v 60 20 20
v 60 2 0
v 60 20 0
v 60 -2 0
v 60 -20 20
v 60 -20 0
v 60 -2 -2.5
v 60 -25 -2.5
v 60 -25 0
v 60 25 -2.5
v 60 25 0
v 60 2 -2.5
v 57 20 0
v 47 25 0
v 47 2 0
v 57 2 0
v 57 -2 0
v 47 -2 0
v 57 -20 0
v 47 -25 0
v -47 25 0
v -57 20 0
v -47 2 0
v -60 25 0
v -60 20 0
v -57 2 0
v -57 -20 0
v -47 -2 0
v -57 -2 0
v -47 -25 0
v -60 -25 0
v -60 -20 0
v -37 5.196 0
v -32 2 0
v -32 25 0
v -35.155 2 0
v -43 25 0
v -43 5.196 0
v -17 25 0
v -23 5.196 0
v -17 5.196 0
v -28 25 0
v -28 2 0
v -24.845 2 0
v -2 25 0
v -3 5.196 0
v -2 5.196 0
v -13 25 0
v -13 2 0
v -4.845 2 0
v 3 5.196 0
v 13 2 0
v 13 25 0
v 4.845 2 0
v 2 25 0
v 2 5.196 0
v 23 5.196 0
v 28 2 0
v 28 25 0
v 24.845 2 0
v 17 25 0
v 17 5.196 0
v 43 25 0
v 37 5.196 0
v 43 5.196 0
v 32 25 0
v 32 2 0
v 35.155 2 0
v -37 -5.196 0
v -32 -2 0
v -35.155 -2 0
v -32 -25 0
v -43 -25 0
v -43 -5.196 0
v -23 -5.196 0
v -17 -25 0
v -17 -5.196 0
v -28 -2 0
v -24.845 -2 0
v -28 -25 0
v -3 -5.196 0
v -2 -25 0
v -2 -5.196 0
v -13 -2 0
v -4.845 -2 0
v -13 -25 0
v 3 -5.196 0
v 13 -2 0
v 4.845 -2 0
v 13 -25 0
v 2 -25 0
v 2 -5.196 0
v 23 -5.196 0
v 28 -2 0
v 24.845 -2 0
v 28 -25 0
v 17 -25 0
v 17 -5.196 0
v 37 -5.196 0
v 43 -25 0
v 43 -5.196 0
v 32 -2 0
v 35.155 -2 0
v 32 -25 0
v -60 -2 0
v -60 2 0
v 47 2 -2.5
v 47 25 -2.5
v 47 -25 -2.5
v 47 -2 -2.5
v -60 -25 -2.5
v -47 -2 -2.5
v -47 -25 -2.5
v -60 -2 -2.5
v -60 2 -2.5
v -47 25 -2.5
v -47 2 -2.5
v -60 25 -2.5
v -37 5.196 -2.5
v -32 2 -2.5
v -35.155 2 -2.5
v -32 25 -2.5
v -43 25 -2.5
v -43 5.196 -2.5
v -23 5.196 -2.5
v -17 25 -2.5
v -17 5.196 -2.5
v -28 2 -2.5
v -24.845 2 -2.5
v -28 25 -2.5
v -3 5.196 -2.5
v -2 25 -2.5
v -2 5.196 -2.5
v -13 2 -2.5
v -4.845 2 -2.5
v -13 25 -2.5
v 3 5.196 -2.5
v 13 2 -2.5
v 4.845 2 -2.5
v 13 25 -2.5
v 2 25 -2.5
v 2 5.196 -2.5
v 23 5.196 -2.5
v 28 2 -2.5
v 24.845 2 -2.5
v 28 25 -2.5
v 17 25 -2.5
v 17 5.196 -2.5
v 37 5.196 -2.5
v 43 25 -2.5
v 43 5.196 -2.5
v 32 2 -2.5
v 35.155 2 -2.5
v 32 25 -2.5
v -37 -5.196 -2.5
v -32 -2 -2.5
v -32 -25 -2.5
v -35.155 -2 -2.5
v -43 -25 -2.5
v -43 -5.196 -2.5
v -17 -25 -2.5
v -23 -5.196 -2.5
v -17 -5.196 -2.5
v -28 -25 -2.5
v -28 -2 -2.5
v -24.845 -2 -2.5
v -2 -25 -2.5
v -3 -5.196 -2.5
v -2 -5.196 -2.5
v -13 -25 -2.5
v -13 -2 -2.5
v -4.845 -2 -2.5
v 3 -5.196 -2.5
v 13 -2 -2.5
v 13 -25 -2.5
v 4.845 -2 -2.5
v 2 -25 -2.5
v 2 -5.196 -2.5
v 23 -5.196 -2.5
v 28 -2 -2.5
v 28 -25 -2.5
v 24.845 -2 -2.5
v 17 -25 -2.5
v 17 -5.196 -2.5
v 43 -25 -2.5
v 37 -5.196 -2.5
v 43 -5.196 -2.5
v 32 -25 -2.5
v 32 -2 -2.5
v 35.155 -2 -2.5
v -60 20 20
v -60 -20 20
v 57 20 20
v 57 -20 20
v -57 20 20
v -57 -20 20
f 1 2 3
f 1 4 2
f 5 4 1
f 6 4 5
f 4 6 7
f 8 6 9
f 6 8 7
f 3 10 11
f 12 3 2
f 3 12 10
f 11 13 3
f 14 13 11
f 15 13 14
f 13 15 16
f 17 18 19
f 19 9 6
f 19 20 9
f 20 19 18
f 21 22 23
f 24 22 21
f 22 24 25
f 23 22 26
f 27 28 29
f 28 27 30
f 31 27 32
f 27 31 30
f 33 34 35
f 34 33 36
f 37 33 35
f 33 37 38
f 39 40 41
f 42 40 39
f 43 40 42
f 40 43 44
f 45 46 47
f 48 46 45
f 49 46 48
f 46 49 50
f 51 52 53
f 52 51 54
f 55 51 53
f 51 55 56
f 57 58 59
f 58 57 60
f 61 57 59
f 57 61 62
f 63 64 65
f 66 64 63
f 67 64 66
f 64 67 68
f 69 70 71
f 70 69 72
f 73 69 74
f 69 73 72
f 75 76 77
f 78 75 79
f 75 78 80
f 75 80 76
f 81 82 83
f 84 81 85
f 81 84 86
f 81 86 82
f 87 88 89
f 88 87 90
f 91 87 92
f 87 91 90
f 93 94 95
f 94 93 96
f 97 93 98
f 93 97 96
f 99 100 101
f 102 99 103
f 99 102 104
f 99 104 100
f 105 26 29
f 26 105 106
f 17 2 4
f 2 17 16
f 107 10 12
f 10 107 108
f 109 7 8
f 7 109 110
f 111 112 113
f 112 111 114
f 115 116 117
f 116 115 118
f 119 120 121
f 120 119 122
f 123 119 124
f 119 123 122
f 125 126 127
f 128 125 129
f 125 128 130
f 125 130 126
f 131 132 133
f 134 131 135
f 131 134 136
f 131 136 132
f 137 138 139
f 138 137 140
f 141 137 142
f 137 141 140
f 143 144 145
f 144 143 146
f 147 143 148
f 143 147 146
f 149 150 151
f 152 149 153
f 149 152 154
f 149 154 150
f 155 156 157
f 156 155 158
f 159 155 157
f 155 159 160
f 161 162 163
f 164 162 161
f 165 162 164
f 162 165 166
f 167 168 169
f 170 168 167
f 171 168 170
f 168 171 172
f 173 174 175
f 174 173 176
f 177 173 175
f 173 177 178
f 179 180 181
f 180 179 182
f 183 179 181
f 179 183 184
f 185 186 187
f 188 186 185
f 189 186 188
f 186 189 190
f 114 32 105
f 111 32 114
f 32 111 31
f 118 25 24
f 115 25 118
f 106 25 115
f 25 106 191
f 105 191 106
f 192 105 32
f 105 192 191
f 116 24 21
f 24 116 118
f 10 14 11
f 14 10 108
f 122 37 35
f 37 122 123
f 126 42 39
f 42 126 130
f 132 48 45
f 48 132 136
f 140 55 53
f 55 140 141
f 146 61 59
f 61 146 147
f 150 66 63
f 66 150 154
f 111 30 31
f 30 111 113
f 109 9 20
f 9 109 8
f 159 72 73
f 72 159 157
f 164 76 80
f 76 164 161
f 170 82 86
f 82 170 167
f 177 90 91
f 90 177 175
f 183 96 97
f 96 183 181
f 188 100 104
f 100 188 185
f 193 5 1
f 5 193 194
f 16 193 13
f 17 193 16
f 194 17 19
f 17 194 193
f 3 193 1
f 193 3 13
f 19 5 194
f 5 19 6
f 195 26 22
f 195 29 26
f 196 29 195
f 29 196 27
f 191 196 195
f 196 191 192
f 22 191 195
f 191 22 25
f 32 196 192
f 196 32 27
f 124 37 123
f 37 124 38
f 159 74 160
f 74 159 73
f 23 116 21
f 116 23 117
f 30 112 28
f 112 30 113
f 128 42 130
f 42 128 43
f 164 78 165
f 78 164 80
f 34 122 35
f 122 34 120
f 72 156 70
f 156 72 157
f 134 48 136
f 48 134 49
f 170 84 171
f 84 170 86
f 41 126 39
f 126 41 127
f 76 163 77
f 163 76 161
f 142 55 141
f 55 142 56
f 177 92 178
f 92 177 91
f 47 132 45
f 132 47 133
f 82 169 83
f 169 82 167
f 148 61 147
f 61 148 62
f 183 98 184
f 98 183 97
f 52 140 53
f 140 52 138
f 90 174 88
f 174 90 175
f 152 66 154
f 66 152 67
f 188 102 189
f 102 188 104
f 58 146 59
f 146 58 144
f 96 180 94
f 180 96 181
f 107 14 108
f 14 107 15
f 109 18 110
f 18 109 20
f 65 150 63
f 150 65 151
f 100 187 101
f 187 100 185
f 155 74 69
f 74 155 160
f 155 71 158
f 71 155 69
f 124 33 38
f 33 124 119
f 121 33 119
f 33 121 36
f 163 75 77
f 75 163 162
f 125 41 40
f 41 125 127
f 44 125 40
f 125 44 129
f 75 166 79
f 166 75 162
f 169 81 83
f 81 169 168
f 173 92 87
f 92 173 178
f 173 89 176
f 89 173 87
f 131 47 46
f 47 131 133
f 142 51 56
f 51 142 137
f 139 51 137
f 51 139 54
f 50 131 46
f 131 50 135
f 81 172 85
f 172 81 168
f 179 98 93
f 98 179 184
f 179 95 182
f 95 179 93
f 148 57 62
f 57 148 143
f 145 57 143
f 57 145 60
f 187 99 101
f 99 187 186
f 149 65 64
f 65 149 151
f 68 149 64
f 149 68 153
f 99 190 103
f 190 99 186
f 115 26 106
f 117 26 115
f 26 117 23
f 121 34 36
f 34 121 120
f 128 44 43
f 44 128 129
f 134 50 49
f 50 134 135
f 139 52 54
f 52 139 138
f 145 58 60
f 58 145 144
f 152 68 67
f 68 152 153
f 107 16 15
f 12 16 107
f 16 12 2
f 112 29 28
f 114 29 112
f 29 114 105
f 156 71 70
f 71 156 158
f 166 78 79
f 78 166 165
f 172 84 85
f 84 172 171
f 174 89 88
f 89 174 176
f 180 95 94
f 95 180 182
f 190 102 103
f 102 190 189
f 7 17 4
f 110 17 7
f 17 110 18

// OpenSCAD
// ============================================================
// 06_电池固定座.scad — 通用电池绑带托盘 v4
// ============================================================
// 设计：底板 + 前后挡块 + 多道扎带槽
//       托盘放在底盘下方, 电池放在托盘上
//       扎带从底盘上面穿过底盘槽→托盘槽→绕过电池→回到上面收紧
//       一层扎带同时固定托盘和电池, 不需要螺丝
//       适配: 长80~120mm, 宽30~40mm 的各种锂电
// ============================================================

/* [全局参数] */
base_length  = 120;   // 底板长
base_width   = 50;    // 底板宽
base_thick   = 2.5;   // 底板厚

// 挡块
block_width  = 40;    // 挡块宽
block_height = 20;    // 挡块高
block_thick  = 3;     // 挡块厚

// 扎带槽 (与底盘扎带槽大致对齐即可)
strap_w      = 4;     // 槽宽
strap_step   = 15;    // 槽间距

// ============================================================
module battery_holder() {
    difference() {
        union() {
            // 底板
            translate([0, 0, -base_thick/2])
            cube([base_length, base_width, base_thick], center = true);

            // 前挡块
            translate([base_length/2 - block_thick/2, 0, block_height/2])
            cube([block_thick, block_width, block_height], center = true);

            // 后挡块
            translate([-base_length/2 + block_thick/2, 0, block_height/2])
            cube([block_thick, block_width, block_height], center = true);

            // 底板加强筋
            for (x = [-30, 0, 30])
                translate([x, 0, -base_thick/2 + 0.5])
                cube([2, base_width - 6, 1], center = true);
        }

        // ===== 横向扎带槽 (多道, 与底盘槽协同) =====
        for (x = [-base_length/2 + 15 : strap_step : base_length/2 - 15])
            translate([x, 0, -base_thick/2 - 0.5])
            cube([strap_w, base_width + 10, base_thick + 1], center = true);

        // ===== 纵向槽 (防侧滑) =====
        translate([0, 0, -base_thick/2 - 0.5])
        cube([base_length + 10, strap_w, base_thick + 1], center = true);

        // ===== 减重底孔 =====
        for (x = [-40, -20, 0, 20, 40])
            translate([x, 0, -base_thick/2 - 0.5])
            cylinder(d = 12, h = base_thick + 1, center = true, $fn = 6);
    }
}

battery_holder();

// ============================================================
// 安装方式:
// 1. 托盘放在底盘正下方, 电池放在托盘上(压在前后挡块之间)
// 2. 4根扎带从底盘上面往下穿:
//    底盘网格孔/扎带槽 → 托盘槽 → 绕过电池底部 → 另一侧上来
// 3. 收紧扎带 → 电池被压在托盘上, 托盘被压在底盘下
//    一层扎带同时固定两样东西
//
// 如果电池比挡块间距短: 垫泡沫/EVA棉
// 如果电池比挡块间距长: 把挡块切掉一个, 靠扎带限位
//
// 打印: 层高0.2, 填充20%, 底板朝下, ~1.5h
// ============================================================
